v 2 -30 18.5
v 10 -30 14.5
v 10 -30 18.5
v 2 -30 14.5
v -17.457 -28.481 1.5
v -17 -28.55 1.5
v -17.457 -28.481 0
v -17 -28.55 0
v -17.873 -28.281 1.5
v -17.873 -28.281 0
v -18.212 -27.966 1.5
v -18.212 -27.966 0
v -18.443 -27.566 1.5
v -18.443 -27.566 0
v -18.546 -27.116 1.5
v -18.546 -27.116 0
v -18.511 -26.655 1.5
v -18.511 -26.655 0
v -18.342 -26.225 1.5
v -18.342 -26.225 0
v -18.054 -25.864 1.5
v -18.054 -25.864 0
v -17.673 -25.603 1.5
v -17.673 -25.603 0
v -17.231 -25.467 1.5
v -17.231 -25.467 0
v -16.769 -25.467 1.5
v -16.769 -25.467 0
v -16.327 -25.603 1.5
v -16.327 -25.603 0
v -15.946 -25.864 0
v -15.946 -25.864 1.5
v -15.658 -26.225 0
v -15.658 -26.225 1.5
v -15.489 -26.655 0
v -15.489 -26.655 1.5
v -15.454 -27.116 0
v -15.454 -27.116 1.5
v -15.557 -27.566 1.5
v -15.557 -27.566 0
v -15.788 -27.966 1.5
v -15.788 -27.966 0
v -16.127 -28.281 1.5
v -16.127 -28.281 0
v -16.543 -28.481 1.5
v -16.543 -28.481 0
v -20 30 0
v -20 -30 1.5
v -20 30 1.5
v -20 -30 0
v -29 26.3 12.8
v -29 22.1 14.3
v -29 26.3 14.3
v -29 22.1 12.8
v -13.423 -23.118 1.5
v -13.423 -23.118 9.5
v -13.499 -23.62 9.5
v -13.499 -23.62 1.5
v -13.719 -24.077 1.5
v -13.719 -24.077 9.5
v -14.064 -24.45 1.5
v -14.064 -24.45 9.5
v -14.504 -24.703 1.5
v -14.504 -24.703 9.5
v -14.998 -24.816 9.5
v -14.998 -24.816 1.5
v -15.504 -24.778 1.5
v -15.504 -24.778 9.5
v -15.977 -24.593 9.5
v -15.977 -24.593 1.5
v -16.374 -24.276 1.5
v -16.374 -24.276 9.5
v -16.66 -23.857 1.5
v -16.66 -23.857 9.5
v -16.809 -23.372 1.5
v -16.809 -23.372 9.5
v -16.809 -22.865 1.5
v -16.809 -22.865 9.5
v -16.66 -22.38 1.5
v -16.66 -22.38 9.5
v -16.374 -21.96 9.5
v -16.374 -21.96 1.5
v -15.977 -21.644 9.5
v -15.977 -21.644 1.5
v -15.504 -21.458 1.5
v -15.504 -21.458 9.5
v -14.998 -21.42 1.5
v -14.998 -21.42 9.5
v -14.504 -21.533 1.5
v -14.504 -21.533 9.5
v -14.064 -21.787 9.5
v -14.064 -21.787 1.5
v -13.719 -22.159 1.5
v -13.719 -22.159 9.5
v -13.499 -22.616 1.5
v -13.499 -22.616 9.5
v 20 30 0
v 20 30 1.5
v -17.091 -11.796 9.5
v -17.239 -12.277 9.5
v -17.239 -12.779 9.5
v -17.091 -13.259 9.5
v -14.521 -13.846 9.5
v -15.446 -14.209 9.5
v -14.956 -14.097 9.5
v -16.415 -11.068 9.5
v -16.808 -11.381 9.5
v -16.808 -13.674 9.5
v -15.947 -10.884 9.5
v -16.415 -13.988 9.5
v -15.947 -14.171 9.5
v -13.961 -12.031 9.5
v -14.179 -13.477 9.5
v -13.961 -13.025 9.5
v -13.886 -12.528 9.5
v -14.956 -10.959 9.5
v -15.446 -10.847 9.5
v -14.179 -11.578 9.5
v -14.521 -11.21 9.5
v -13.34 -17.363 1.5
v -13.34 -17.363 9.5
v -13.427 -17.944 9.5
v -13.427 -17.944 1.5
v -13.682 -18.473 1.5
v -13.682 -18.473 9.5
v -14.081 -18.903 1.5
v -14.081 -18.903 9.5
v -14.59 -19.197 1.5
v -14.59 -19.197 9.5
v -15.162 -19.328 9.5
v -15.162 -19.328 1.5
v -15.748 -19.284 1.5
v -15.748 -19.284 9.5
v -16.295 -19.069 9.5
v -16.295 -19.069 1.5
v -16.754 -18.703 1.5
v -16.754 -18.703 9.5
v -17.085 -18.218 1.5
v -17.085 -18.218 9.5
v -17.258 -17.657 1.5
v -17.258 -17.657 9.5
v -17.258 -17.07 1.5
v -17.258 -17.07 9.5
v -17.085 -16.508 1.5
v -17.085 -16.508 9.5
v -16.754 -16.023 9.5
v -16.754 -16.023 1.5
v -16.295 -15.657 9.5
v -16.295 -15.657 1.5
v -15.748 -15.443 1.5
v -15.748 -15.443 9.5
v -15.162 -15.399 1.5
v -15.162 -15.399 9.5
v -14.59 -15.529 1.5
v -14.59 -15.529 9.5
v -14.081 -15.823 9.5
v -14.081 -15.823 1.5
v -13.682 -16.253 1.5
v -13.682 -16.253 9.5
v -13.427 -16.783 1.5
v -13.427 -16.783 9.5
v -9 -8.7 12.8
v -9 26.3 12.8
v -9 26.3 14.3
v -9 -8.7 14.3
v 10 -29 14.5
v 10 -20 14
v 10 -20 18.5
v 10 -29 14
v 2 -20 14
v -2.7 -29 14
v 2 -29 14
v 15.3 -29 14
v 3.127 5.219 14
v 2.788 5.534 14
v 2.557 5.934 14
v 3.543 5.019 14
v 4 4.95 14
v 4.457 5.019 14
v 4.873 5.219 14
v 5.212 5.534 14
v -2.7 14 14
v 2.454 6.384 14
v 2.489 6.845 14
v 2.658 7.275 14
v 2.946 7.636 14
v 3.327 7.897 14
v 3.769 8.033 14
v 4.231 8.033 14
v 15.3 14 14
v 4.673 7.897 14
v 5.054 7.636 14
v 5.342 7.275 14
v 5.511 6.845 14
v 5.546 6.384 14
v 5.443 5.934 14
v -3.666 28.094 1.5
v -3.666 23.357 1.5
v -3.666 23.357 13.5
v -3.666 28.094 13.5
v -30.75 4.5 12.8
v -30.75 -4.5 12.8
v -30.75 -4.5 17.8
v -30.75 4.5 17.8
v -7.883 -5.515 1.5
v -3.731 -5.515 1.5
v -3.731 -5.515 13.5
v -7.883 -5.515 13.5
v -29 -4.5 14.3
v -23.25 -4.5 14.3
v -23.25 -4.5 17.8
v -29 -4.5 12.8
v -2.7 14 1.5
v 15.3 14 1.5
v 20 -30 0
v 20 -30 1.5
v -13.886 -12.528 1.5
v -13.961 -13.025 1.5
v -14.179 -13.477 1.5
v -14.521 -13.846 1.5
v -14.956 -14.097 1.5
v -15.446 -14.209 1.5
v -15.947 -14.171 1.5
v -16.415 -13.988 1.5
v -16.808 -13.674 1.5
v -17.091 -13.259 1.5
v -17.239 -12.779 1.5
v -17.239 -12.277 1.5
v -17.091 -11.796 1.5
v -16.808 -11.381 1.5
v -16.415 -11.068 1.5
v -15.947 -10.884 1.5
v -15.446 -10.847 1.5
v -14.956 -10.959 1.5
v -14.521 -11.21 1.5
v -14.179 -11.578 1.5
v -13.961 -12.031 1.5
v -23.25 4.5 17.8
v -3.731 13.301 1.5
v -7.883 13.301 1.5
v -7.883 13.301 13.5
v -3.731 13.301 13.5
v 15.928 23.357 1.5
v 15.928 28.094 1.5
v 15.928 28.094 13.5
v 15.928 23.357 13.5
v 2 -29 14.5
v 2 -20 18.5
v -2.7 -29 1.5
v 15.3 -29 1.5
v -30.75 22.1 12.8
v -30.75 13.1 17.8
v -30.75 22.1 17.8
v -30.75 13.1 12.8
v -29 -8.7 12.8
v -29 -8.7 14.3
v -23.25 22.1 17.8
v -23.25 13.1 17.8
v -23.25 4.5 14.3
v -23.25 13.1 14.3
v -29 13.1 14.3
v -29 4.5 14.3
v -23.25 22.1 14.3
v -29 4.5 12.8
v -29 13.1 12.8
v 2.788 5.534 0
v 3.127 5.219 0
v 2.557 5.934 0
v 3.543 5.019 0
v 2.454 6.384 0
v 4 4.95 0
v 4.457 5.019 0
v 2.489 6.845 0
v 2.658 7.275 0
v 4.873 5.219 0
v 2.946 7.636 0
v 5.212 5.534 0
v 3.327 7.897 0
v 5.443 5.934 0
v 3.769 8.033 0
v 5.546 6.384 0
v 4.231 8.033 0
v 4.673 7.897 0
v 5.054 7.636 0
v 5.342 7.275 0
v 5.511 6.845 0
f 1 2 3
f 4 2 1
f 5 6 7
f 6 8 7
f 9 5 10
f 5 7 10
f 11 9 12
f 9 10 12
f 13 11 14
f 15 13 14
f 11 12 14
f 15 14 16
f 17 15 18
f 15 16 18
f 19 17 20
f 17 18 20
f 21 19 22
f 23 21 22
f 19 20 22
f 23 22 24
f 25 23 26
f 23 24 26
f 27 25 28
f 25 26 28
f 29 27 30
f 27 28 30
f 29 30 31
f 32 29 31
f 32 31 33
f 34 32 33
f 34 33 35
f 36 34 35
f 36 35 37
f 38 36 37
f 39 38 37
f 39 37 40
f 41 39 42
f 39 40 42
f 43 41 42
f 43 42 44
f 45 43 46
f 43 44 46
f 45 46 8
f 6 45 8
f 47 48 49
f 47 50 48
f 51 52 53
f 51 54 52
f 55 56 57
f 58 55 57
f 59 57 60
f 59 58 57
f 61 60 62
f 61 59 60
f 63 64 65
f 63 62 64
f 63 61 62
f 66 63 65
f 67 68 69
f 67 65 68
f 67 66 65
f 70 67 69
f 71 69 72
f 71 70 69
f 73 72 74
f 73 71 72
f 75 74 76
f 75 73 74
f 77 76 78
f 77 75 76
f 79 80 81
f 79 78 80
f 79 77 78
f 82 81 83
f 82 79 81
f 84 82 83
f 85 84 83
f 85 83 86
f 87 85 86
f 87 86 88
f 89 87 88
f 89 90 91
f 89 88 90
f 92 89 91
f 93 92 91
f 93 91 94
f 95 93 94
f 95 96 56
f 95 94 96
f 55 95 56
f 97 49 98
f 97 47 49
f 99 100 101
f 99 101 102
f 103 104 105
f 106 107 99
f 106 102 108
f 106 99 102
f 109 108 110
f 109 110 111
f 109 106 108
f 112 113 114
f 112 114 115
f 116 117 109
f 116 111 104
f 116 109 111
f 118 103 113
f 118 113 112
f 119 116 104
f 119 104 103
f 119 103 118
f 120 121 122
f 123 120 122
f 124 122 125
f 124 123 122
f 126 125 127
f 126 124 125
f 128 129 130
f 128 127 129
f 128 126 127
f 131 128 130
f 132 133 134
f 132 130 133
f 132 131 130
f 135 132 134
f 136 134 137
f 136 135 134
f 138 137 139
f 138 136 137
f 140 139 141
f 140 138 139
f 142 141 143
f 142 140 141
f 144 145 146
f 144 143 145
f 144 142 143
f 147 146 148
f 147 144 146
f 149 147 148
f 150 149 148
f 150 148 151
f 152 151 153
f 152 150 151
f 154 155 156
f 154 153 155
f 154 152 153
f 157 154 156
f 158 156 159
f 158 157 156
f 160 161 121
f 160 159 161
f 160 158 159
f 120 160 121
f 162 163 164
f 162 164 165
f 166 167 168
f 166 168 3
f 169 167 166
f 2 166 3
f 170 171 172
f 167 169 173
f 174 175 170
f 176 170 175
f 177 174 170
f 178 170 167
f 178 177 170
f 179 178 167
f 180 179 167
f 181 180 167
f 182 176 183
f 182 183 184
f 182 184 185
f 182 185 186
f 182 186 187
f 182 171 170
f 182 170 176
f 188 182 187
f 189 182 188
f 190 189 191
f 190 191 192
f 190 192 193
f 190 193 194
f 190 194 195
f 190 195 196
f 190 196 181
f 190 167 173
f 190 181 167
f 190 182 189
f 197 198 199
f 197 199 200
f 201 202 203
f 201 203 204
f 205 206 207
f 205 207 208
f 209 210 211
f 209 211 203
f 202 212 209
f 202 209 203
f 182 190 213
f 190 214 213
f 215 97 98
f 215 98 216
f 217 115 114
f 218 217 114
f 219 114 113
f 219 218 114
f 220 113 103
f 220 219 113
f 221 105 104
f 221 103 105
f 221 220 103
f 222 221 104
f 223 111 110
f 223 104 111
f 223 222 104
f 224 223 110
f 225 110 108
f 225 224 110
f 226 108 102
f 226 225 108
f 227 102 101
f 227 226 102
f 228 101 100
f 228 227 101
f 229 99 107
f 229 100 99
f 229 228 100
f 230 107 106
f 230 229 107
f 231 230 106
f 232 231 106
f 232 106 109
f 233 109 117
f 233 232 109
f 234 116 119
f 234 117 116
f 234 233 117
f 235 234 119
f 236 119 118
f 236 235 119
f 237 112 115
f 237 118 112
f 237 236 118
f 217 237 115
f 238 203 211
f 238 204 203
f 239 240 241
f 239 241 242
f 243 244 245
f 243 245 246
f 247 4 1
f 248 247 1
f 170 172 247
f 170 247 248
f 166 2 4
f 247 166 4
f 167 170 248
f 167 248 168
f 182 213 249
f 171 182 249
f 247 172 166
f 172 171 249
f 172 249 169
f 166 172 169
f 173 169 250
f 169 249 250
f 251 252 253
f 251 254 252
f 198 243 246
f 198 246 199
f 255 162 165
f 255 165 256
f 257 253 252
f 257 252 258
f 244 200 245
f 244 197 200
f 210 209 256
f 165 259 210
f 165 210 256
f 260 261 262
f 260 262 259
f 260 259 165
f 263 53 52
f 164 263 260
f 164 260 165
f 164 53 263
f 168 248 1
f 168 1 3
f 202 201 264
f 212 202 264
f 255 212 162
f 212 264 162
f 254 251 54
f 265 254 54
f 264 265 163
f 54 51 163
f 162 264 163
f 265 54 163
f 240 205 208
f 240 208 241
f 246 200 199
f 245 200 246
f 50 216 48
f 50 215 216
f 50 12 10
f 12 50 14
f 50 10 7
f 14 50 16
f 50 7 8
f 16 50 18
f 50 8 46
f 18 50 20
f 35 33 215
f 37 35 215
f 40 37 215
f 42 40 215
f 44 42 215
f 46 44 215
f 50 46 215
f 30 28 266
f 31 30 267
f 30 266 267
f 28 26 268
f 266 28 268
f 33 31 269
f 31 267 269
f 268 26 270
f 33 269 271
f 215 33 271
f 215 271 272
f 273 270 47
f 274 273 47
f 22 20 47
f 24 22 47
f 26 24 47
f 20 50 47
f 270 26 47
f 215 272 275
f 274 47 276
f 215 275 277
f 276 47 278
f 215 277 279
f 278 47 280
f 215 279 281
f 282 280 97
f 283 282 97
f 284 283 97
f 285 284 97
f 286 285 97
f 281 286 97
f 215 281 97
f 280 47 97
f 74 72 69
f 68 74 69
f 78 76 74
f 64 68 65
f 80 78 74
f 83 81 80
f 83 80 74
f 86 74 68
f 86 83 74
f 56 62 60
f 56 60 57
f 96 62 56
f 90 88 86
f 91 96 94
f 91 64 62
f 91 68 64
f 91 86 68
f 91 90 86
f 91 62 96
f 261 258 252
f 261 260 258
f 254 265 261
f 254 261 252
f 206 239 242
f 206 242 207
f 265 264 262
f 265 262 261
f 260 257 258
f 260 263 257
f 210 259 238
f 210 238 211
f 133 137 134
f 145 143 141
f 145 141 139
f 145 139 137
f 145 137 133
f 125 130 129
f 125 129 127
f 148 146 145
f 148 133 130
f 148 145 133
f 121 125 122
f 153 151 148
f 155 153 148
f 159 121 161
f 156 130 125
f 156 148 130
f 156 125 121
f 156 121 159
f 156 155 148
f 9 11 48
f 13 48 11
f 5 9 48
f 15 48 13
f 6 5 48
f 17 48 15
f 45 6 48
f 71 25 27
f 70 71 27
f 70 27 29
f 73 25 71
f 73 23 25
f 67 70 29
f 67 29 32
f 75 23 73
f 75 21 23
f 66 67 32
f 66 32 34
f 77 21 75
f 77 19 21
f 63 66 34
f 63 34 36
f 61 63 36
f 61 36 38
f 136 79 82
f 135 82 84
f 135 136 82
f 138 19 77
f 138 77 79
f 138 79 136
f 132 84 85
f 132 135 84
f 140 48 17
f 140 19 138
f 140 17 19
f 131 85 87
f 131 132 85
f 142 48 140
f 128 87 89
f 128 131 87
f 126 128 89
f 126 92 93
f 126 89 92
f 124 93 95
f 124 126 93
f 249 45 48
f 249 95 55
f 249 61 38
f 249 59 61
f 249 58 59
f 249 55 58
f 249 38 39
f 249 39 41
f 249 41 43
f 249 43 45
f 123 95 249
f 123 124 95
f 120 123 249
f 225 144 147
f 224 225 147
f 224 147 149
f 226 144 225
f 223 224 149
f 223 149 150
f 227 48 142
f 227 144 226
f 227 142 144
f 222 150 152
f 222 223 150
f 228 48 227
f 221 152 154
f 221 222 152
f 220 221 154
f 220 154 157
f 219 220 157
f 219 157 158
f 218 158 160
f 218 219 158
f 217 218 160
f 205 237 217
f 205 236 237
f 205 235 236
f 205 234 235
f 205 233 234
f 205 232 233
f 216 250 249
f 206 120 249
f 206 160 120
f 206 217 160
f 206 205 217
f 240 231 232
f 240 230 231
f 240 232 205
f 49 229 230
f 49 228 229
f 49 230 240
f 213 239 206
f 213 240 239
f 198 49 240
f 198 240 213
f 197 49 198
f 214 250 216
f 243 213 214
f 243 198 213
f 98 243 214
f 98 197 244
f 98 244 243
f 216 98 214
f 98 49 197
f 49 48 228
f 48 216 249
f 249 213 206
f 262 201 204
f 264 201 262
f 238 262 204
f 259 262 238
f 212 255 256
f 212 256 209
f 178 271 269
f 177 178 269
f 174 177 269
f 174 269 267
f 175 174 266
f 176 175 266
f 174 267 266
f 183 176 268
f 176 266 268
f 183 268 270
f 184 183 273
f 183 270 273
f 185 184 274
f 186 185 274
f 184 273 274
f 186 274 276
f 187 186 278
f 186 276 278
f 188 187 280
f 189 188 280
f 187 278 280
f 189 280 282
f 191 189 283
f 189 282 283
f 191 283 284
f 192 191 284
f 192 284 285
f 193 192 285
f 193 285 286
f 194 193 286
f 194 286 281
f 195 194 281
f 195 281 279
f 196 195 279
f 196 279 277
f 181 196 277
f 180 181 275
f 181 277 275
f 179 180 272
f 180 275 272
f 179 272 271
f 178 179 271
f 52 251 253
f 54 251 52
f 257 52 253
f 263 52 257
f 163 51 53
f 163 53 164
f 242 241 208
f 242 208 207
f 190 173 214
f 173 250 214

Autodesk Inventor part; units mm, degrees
ref_plane "YZ Plane" through (0, 0, 0) normal (1, 0, 0) x (0, 1, 0)
sketch "Skizze1" plane through (0, 0, 0) normal (0, 0, 1) x (1, 0, 0)
  line L0 (-20, 30) -> (20, 30)
  line L1 (20, 30) -> (20, -30)
  line L2 (20, -30) -> (-20, -30)
  line L3 (-20, -30) -> (-20, 30)
  line L4 (-20, 30) -> (20, -30) construction
  line L5 (20, 30) -> (-20, -30) construction
  point P0 (0, 0)
  dimension "d0" = 40
  dimension "d1" = 60
extrude "Extrusion1" add sketch "Skizze1" along normal blind 1.5
sketch "Skizze2" plane through (0, 0, 1.5) normal (0, 0, 1) x (1, 0, 0)
  line L0 (-20, -30) -> (20, -30) projected
  line L1 (10, -30) -> (2, -30)
  line L2 (2, -30) -> (2, -20)
  line L3 (2, -20) -> (10, -20)
  line L4 (10, -20) -> (10, -30)
  line L5 (20, -30) -> (20, 30) projected
  point P0 (0, 0)
  dimension "d4" = 8
  dimension "d5" = 10
  dimension "d6" = 10
extrude "Extrusion2" add sketch "Skizze2" along normal blind 17
sketch "Skizze3" plane through (-20, -30, 0) normal (0, -1, 0) x (1, 0, 0)
  line L0 (0, 1.5) -> (22, 1.5) projected
  line L1 (30, 1.5) -> (30, 18.5) projected
  line L2 (22, 1.5) -> (30, 1.5)
  line L3 (30, 1.5) -> (30, 14.5)
  line L4 (30, 14.5) -> (22, 14.5)
  line L5 (22, 14.5) -> (22, 1.5)
  line L6 (22, 18.5) -> (30, 18.5) projected
  point P0 (20, 0)
  dimension "d9" = 4
extrude "Extrusion3" cut sketch "Skizze3" against normal blind 1
ref_plane "Arbeitsebene1" through (0, 0, 12.8) normal (0, 0, 1) x (1, 0, 0)
sketch "Skizze4" plane through (0, 0, 12.8) normal (0, 0, 1) x (1, 0, 0)
  line L0 (-29, 26.3) -> (-9, 26.3)
  line L1 (-9, 26.3) -> (-9, -8.7)
  line L2 (-9, -8.7) -> (-29, -8.7)
  line L3 (-29, -8.7) -> (-29, 26.3)
  line L4 (20, 30) -> (-20, 30) projected
  line L5 (20, -30) -> (20, 30) projected
  point P0 (0, 0)
  dimension "d12" = 35
  dimension "d13" = 20
  dimension "d14" = 3.7
  dimension "d15" = 29
extrude "Extrusion4" add sketch "Skizze4" along normal blind 1.5
sketch "Skizze5" plane through (0, 0, 14.3) normal (0, 0, 1) x (1, 0, 0)
  line L0 (-30.75, 22.1) -> (-23.25, 22.1)
  line L1 (-23.25, 22.1) -> (-23.25, 13.1)
  line L2 (-23.25, 13.1) -> (-30.75, 13.1)
  line L3 (-30.75, 13.1) -> (-30.75, 22.1)
  line L4 (-30.75, 4.5) -> (-23.25, 4.5)
  line L5 (-23.25, 4.5) -> (-23.25, -4.5)
  line L6 (-23.25, -4.5) -> (-30.75, -4.5)
  line L7 (-30.75, -4.5) -> (-30.75, 4.5)
  line L8 (-29, 26.3) -> (-29, -8.7) projected
  line L9 (-9, 26.3) -> (-29, 26.3) projected
  line L10 (-29, -8.7) -> (-9, -8.7) projected
  point P0 (0, 0)
  dimension "d19" = 7.5
  dimension "d20" = 9
  dimension "d21" = 1.75
  dimension "d22" = 4.2
  dimension "d23" = 4.2
  dimension "d24" = 9
extrude "Extrusion5" add sketch "Skizze5" along normal blind 3.5 and the other way blind 1.5
sketch "Skizze6" plane through (0, 0, 1.5) normal (0, 0, 1) x (1, 0, 0)
  line L0 (-2.7, -29) -> (15.3, -29)
  line L1 (15.3, -29) -> (15.3, 14)
  line L2 (15.3, 14) -> (-2.7, 14)
  line L3 (-2.7, 14) -> (-2.7, -29)
  line L4 (20, -30) -> (20, 30) projected
  point P0 (0, 0)
  point P1 (2, -29)
  dimension "d29" = 18
  dimension "d30" = 43
  dimension "d31" = 4.7
extrude "Extrusion6" add sketch "Skizze6" along normal blind 12.5
sketch "Skizze7" plane through (0, 0, 1.5) normal (0, 0, 1) x (1, 0, 0)
  circle A0 centre (-15.5723, -12.5278) radius 1.6858
  circle A1 centre (-15.3096, -17.3632) radius 1.97
  circle A2 centre (-15.1256, -23.1183) radius 1.7027
  point P0 (0, 0)
extrude "Extrusion7" add sketch "Skizze7" along normal blind 8
sketch "Skizze8" plane through (0, 0, 1.5) normal (0, 0, 1) x (1, 0, 0)
  line L0 (-3.6658, 28.0935) -> (15.9283, 28.0935)
  line L1 (15.9283, 28.0935) -> (15.9283, 23.3572)
  line L2 (15.9283, 23.3572) -> (-3.6658, 23.3572)
  line L3 (-3.6658, 23.3572) -> (-3.6658, 28.0935)
  point P0 (0, 0)
extrude "Extrusion8" add sketch "Skizze8" along normal blind 12
sketch "Skizze9" plane through (0, 0, 1.5) normal (0, 0, 1) x (1, 0, 0)
  line L0 (-7.8831, 13.3006) -> (-3.7307, 13.3006)
  line L1 (-3.7307, 13.3006) -> (-3.7307, -5.5149)
  line L2 (-3.7307, -5.5149) -> (-7.8831, -5.5149)
  line L3 (-7.8831, -5.5149) -> (-7.8831, 13.3006)
  point P0 (0, 0)
extrude "Extrusion9" add sketch "Skizze9" along normal blind 12
ref_plane "Arbeitsebene2" through (0, 0, 16.25) normal (0, 0, 1) x (1, 0, 0)
sketch "Skizze10" plane through (0, 0, 16.25) normal (0, 0, 1) x (1, 0, 0)
  line L0 (-20, -30) -> (20, -30) projected
  line L1 (-20, 30) -> (-20, -30) projected
  line L2 (20, -30) -> (20, 30) projected
  point P0 (0, 0)
  point P1 (-17, -27)
  point P2 (4, 6.5)
  dimension "d40" = 3
  dimension "d41" = 3
  dimension "d42" = 16
  dimension "d43" = 36.5
hole "Bohrung1" at (-17, -27, 16.25) at (4, 6.5, 16.25) direction (0, 0, -1) diameter 3.1 end through all
equation "\"d23\" = d22"
equation "\"d24\" = d20"
equation "\"d41\" = d40"
properties part number "Platine"
